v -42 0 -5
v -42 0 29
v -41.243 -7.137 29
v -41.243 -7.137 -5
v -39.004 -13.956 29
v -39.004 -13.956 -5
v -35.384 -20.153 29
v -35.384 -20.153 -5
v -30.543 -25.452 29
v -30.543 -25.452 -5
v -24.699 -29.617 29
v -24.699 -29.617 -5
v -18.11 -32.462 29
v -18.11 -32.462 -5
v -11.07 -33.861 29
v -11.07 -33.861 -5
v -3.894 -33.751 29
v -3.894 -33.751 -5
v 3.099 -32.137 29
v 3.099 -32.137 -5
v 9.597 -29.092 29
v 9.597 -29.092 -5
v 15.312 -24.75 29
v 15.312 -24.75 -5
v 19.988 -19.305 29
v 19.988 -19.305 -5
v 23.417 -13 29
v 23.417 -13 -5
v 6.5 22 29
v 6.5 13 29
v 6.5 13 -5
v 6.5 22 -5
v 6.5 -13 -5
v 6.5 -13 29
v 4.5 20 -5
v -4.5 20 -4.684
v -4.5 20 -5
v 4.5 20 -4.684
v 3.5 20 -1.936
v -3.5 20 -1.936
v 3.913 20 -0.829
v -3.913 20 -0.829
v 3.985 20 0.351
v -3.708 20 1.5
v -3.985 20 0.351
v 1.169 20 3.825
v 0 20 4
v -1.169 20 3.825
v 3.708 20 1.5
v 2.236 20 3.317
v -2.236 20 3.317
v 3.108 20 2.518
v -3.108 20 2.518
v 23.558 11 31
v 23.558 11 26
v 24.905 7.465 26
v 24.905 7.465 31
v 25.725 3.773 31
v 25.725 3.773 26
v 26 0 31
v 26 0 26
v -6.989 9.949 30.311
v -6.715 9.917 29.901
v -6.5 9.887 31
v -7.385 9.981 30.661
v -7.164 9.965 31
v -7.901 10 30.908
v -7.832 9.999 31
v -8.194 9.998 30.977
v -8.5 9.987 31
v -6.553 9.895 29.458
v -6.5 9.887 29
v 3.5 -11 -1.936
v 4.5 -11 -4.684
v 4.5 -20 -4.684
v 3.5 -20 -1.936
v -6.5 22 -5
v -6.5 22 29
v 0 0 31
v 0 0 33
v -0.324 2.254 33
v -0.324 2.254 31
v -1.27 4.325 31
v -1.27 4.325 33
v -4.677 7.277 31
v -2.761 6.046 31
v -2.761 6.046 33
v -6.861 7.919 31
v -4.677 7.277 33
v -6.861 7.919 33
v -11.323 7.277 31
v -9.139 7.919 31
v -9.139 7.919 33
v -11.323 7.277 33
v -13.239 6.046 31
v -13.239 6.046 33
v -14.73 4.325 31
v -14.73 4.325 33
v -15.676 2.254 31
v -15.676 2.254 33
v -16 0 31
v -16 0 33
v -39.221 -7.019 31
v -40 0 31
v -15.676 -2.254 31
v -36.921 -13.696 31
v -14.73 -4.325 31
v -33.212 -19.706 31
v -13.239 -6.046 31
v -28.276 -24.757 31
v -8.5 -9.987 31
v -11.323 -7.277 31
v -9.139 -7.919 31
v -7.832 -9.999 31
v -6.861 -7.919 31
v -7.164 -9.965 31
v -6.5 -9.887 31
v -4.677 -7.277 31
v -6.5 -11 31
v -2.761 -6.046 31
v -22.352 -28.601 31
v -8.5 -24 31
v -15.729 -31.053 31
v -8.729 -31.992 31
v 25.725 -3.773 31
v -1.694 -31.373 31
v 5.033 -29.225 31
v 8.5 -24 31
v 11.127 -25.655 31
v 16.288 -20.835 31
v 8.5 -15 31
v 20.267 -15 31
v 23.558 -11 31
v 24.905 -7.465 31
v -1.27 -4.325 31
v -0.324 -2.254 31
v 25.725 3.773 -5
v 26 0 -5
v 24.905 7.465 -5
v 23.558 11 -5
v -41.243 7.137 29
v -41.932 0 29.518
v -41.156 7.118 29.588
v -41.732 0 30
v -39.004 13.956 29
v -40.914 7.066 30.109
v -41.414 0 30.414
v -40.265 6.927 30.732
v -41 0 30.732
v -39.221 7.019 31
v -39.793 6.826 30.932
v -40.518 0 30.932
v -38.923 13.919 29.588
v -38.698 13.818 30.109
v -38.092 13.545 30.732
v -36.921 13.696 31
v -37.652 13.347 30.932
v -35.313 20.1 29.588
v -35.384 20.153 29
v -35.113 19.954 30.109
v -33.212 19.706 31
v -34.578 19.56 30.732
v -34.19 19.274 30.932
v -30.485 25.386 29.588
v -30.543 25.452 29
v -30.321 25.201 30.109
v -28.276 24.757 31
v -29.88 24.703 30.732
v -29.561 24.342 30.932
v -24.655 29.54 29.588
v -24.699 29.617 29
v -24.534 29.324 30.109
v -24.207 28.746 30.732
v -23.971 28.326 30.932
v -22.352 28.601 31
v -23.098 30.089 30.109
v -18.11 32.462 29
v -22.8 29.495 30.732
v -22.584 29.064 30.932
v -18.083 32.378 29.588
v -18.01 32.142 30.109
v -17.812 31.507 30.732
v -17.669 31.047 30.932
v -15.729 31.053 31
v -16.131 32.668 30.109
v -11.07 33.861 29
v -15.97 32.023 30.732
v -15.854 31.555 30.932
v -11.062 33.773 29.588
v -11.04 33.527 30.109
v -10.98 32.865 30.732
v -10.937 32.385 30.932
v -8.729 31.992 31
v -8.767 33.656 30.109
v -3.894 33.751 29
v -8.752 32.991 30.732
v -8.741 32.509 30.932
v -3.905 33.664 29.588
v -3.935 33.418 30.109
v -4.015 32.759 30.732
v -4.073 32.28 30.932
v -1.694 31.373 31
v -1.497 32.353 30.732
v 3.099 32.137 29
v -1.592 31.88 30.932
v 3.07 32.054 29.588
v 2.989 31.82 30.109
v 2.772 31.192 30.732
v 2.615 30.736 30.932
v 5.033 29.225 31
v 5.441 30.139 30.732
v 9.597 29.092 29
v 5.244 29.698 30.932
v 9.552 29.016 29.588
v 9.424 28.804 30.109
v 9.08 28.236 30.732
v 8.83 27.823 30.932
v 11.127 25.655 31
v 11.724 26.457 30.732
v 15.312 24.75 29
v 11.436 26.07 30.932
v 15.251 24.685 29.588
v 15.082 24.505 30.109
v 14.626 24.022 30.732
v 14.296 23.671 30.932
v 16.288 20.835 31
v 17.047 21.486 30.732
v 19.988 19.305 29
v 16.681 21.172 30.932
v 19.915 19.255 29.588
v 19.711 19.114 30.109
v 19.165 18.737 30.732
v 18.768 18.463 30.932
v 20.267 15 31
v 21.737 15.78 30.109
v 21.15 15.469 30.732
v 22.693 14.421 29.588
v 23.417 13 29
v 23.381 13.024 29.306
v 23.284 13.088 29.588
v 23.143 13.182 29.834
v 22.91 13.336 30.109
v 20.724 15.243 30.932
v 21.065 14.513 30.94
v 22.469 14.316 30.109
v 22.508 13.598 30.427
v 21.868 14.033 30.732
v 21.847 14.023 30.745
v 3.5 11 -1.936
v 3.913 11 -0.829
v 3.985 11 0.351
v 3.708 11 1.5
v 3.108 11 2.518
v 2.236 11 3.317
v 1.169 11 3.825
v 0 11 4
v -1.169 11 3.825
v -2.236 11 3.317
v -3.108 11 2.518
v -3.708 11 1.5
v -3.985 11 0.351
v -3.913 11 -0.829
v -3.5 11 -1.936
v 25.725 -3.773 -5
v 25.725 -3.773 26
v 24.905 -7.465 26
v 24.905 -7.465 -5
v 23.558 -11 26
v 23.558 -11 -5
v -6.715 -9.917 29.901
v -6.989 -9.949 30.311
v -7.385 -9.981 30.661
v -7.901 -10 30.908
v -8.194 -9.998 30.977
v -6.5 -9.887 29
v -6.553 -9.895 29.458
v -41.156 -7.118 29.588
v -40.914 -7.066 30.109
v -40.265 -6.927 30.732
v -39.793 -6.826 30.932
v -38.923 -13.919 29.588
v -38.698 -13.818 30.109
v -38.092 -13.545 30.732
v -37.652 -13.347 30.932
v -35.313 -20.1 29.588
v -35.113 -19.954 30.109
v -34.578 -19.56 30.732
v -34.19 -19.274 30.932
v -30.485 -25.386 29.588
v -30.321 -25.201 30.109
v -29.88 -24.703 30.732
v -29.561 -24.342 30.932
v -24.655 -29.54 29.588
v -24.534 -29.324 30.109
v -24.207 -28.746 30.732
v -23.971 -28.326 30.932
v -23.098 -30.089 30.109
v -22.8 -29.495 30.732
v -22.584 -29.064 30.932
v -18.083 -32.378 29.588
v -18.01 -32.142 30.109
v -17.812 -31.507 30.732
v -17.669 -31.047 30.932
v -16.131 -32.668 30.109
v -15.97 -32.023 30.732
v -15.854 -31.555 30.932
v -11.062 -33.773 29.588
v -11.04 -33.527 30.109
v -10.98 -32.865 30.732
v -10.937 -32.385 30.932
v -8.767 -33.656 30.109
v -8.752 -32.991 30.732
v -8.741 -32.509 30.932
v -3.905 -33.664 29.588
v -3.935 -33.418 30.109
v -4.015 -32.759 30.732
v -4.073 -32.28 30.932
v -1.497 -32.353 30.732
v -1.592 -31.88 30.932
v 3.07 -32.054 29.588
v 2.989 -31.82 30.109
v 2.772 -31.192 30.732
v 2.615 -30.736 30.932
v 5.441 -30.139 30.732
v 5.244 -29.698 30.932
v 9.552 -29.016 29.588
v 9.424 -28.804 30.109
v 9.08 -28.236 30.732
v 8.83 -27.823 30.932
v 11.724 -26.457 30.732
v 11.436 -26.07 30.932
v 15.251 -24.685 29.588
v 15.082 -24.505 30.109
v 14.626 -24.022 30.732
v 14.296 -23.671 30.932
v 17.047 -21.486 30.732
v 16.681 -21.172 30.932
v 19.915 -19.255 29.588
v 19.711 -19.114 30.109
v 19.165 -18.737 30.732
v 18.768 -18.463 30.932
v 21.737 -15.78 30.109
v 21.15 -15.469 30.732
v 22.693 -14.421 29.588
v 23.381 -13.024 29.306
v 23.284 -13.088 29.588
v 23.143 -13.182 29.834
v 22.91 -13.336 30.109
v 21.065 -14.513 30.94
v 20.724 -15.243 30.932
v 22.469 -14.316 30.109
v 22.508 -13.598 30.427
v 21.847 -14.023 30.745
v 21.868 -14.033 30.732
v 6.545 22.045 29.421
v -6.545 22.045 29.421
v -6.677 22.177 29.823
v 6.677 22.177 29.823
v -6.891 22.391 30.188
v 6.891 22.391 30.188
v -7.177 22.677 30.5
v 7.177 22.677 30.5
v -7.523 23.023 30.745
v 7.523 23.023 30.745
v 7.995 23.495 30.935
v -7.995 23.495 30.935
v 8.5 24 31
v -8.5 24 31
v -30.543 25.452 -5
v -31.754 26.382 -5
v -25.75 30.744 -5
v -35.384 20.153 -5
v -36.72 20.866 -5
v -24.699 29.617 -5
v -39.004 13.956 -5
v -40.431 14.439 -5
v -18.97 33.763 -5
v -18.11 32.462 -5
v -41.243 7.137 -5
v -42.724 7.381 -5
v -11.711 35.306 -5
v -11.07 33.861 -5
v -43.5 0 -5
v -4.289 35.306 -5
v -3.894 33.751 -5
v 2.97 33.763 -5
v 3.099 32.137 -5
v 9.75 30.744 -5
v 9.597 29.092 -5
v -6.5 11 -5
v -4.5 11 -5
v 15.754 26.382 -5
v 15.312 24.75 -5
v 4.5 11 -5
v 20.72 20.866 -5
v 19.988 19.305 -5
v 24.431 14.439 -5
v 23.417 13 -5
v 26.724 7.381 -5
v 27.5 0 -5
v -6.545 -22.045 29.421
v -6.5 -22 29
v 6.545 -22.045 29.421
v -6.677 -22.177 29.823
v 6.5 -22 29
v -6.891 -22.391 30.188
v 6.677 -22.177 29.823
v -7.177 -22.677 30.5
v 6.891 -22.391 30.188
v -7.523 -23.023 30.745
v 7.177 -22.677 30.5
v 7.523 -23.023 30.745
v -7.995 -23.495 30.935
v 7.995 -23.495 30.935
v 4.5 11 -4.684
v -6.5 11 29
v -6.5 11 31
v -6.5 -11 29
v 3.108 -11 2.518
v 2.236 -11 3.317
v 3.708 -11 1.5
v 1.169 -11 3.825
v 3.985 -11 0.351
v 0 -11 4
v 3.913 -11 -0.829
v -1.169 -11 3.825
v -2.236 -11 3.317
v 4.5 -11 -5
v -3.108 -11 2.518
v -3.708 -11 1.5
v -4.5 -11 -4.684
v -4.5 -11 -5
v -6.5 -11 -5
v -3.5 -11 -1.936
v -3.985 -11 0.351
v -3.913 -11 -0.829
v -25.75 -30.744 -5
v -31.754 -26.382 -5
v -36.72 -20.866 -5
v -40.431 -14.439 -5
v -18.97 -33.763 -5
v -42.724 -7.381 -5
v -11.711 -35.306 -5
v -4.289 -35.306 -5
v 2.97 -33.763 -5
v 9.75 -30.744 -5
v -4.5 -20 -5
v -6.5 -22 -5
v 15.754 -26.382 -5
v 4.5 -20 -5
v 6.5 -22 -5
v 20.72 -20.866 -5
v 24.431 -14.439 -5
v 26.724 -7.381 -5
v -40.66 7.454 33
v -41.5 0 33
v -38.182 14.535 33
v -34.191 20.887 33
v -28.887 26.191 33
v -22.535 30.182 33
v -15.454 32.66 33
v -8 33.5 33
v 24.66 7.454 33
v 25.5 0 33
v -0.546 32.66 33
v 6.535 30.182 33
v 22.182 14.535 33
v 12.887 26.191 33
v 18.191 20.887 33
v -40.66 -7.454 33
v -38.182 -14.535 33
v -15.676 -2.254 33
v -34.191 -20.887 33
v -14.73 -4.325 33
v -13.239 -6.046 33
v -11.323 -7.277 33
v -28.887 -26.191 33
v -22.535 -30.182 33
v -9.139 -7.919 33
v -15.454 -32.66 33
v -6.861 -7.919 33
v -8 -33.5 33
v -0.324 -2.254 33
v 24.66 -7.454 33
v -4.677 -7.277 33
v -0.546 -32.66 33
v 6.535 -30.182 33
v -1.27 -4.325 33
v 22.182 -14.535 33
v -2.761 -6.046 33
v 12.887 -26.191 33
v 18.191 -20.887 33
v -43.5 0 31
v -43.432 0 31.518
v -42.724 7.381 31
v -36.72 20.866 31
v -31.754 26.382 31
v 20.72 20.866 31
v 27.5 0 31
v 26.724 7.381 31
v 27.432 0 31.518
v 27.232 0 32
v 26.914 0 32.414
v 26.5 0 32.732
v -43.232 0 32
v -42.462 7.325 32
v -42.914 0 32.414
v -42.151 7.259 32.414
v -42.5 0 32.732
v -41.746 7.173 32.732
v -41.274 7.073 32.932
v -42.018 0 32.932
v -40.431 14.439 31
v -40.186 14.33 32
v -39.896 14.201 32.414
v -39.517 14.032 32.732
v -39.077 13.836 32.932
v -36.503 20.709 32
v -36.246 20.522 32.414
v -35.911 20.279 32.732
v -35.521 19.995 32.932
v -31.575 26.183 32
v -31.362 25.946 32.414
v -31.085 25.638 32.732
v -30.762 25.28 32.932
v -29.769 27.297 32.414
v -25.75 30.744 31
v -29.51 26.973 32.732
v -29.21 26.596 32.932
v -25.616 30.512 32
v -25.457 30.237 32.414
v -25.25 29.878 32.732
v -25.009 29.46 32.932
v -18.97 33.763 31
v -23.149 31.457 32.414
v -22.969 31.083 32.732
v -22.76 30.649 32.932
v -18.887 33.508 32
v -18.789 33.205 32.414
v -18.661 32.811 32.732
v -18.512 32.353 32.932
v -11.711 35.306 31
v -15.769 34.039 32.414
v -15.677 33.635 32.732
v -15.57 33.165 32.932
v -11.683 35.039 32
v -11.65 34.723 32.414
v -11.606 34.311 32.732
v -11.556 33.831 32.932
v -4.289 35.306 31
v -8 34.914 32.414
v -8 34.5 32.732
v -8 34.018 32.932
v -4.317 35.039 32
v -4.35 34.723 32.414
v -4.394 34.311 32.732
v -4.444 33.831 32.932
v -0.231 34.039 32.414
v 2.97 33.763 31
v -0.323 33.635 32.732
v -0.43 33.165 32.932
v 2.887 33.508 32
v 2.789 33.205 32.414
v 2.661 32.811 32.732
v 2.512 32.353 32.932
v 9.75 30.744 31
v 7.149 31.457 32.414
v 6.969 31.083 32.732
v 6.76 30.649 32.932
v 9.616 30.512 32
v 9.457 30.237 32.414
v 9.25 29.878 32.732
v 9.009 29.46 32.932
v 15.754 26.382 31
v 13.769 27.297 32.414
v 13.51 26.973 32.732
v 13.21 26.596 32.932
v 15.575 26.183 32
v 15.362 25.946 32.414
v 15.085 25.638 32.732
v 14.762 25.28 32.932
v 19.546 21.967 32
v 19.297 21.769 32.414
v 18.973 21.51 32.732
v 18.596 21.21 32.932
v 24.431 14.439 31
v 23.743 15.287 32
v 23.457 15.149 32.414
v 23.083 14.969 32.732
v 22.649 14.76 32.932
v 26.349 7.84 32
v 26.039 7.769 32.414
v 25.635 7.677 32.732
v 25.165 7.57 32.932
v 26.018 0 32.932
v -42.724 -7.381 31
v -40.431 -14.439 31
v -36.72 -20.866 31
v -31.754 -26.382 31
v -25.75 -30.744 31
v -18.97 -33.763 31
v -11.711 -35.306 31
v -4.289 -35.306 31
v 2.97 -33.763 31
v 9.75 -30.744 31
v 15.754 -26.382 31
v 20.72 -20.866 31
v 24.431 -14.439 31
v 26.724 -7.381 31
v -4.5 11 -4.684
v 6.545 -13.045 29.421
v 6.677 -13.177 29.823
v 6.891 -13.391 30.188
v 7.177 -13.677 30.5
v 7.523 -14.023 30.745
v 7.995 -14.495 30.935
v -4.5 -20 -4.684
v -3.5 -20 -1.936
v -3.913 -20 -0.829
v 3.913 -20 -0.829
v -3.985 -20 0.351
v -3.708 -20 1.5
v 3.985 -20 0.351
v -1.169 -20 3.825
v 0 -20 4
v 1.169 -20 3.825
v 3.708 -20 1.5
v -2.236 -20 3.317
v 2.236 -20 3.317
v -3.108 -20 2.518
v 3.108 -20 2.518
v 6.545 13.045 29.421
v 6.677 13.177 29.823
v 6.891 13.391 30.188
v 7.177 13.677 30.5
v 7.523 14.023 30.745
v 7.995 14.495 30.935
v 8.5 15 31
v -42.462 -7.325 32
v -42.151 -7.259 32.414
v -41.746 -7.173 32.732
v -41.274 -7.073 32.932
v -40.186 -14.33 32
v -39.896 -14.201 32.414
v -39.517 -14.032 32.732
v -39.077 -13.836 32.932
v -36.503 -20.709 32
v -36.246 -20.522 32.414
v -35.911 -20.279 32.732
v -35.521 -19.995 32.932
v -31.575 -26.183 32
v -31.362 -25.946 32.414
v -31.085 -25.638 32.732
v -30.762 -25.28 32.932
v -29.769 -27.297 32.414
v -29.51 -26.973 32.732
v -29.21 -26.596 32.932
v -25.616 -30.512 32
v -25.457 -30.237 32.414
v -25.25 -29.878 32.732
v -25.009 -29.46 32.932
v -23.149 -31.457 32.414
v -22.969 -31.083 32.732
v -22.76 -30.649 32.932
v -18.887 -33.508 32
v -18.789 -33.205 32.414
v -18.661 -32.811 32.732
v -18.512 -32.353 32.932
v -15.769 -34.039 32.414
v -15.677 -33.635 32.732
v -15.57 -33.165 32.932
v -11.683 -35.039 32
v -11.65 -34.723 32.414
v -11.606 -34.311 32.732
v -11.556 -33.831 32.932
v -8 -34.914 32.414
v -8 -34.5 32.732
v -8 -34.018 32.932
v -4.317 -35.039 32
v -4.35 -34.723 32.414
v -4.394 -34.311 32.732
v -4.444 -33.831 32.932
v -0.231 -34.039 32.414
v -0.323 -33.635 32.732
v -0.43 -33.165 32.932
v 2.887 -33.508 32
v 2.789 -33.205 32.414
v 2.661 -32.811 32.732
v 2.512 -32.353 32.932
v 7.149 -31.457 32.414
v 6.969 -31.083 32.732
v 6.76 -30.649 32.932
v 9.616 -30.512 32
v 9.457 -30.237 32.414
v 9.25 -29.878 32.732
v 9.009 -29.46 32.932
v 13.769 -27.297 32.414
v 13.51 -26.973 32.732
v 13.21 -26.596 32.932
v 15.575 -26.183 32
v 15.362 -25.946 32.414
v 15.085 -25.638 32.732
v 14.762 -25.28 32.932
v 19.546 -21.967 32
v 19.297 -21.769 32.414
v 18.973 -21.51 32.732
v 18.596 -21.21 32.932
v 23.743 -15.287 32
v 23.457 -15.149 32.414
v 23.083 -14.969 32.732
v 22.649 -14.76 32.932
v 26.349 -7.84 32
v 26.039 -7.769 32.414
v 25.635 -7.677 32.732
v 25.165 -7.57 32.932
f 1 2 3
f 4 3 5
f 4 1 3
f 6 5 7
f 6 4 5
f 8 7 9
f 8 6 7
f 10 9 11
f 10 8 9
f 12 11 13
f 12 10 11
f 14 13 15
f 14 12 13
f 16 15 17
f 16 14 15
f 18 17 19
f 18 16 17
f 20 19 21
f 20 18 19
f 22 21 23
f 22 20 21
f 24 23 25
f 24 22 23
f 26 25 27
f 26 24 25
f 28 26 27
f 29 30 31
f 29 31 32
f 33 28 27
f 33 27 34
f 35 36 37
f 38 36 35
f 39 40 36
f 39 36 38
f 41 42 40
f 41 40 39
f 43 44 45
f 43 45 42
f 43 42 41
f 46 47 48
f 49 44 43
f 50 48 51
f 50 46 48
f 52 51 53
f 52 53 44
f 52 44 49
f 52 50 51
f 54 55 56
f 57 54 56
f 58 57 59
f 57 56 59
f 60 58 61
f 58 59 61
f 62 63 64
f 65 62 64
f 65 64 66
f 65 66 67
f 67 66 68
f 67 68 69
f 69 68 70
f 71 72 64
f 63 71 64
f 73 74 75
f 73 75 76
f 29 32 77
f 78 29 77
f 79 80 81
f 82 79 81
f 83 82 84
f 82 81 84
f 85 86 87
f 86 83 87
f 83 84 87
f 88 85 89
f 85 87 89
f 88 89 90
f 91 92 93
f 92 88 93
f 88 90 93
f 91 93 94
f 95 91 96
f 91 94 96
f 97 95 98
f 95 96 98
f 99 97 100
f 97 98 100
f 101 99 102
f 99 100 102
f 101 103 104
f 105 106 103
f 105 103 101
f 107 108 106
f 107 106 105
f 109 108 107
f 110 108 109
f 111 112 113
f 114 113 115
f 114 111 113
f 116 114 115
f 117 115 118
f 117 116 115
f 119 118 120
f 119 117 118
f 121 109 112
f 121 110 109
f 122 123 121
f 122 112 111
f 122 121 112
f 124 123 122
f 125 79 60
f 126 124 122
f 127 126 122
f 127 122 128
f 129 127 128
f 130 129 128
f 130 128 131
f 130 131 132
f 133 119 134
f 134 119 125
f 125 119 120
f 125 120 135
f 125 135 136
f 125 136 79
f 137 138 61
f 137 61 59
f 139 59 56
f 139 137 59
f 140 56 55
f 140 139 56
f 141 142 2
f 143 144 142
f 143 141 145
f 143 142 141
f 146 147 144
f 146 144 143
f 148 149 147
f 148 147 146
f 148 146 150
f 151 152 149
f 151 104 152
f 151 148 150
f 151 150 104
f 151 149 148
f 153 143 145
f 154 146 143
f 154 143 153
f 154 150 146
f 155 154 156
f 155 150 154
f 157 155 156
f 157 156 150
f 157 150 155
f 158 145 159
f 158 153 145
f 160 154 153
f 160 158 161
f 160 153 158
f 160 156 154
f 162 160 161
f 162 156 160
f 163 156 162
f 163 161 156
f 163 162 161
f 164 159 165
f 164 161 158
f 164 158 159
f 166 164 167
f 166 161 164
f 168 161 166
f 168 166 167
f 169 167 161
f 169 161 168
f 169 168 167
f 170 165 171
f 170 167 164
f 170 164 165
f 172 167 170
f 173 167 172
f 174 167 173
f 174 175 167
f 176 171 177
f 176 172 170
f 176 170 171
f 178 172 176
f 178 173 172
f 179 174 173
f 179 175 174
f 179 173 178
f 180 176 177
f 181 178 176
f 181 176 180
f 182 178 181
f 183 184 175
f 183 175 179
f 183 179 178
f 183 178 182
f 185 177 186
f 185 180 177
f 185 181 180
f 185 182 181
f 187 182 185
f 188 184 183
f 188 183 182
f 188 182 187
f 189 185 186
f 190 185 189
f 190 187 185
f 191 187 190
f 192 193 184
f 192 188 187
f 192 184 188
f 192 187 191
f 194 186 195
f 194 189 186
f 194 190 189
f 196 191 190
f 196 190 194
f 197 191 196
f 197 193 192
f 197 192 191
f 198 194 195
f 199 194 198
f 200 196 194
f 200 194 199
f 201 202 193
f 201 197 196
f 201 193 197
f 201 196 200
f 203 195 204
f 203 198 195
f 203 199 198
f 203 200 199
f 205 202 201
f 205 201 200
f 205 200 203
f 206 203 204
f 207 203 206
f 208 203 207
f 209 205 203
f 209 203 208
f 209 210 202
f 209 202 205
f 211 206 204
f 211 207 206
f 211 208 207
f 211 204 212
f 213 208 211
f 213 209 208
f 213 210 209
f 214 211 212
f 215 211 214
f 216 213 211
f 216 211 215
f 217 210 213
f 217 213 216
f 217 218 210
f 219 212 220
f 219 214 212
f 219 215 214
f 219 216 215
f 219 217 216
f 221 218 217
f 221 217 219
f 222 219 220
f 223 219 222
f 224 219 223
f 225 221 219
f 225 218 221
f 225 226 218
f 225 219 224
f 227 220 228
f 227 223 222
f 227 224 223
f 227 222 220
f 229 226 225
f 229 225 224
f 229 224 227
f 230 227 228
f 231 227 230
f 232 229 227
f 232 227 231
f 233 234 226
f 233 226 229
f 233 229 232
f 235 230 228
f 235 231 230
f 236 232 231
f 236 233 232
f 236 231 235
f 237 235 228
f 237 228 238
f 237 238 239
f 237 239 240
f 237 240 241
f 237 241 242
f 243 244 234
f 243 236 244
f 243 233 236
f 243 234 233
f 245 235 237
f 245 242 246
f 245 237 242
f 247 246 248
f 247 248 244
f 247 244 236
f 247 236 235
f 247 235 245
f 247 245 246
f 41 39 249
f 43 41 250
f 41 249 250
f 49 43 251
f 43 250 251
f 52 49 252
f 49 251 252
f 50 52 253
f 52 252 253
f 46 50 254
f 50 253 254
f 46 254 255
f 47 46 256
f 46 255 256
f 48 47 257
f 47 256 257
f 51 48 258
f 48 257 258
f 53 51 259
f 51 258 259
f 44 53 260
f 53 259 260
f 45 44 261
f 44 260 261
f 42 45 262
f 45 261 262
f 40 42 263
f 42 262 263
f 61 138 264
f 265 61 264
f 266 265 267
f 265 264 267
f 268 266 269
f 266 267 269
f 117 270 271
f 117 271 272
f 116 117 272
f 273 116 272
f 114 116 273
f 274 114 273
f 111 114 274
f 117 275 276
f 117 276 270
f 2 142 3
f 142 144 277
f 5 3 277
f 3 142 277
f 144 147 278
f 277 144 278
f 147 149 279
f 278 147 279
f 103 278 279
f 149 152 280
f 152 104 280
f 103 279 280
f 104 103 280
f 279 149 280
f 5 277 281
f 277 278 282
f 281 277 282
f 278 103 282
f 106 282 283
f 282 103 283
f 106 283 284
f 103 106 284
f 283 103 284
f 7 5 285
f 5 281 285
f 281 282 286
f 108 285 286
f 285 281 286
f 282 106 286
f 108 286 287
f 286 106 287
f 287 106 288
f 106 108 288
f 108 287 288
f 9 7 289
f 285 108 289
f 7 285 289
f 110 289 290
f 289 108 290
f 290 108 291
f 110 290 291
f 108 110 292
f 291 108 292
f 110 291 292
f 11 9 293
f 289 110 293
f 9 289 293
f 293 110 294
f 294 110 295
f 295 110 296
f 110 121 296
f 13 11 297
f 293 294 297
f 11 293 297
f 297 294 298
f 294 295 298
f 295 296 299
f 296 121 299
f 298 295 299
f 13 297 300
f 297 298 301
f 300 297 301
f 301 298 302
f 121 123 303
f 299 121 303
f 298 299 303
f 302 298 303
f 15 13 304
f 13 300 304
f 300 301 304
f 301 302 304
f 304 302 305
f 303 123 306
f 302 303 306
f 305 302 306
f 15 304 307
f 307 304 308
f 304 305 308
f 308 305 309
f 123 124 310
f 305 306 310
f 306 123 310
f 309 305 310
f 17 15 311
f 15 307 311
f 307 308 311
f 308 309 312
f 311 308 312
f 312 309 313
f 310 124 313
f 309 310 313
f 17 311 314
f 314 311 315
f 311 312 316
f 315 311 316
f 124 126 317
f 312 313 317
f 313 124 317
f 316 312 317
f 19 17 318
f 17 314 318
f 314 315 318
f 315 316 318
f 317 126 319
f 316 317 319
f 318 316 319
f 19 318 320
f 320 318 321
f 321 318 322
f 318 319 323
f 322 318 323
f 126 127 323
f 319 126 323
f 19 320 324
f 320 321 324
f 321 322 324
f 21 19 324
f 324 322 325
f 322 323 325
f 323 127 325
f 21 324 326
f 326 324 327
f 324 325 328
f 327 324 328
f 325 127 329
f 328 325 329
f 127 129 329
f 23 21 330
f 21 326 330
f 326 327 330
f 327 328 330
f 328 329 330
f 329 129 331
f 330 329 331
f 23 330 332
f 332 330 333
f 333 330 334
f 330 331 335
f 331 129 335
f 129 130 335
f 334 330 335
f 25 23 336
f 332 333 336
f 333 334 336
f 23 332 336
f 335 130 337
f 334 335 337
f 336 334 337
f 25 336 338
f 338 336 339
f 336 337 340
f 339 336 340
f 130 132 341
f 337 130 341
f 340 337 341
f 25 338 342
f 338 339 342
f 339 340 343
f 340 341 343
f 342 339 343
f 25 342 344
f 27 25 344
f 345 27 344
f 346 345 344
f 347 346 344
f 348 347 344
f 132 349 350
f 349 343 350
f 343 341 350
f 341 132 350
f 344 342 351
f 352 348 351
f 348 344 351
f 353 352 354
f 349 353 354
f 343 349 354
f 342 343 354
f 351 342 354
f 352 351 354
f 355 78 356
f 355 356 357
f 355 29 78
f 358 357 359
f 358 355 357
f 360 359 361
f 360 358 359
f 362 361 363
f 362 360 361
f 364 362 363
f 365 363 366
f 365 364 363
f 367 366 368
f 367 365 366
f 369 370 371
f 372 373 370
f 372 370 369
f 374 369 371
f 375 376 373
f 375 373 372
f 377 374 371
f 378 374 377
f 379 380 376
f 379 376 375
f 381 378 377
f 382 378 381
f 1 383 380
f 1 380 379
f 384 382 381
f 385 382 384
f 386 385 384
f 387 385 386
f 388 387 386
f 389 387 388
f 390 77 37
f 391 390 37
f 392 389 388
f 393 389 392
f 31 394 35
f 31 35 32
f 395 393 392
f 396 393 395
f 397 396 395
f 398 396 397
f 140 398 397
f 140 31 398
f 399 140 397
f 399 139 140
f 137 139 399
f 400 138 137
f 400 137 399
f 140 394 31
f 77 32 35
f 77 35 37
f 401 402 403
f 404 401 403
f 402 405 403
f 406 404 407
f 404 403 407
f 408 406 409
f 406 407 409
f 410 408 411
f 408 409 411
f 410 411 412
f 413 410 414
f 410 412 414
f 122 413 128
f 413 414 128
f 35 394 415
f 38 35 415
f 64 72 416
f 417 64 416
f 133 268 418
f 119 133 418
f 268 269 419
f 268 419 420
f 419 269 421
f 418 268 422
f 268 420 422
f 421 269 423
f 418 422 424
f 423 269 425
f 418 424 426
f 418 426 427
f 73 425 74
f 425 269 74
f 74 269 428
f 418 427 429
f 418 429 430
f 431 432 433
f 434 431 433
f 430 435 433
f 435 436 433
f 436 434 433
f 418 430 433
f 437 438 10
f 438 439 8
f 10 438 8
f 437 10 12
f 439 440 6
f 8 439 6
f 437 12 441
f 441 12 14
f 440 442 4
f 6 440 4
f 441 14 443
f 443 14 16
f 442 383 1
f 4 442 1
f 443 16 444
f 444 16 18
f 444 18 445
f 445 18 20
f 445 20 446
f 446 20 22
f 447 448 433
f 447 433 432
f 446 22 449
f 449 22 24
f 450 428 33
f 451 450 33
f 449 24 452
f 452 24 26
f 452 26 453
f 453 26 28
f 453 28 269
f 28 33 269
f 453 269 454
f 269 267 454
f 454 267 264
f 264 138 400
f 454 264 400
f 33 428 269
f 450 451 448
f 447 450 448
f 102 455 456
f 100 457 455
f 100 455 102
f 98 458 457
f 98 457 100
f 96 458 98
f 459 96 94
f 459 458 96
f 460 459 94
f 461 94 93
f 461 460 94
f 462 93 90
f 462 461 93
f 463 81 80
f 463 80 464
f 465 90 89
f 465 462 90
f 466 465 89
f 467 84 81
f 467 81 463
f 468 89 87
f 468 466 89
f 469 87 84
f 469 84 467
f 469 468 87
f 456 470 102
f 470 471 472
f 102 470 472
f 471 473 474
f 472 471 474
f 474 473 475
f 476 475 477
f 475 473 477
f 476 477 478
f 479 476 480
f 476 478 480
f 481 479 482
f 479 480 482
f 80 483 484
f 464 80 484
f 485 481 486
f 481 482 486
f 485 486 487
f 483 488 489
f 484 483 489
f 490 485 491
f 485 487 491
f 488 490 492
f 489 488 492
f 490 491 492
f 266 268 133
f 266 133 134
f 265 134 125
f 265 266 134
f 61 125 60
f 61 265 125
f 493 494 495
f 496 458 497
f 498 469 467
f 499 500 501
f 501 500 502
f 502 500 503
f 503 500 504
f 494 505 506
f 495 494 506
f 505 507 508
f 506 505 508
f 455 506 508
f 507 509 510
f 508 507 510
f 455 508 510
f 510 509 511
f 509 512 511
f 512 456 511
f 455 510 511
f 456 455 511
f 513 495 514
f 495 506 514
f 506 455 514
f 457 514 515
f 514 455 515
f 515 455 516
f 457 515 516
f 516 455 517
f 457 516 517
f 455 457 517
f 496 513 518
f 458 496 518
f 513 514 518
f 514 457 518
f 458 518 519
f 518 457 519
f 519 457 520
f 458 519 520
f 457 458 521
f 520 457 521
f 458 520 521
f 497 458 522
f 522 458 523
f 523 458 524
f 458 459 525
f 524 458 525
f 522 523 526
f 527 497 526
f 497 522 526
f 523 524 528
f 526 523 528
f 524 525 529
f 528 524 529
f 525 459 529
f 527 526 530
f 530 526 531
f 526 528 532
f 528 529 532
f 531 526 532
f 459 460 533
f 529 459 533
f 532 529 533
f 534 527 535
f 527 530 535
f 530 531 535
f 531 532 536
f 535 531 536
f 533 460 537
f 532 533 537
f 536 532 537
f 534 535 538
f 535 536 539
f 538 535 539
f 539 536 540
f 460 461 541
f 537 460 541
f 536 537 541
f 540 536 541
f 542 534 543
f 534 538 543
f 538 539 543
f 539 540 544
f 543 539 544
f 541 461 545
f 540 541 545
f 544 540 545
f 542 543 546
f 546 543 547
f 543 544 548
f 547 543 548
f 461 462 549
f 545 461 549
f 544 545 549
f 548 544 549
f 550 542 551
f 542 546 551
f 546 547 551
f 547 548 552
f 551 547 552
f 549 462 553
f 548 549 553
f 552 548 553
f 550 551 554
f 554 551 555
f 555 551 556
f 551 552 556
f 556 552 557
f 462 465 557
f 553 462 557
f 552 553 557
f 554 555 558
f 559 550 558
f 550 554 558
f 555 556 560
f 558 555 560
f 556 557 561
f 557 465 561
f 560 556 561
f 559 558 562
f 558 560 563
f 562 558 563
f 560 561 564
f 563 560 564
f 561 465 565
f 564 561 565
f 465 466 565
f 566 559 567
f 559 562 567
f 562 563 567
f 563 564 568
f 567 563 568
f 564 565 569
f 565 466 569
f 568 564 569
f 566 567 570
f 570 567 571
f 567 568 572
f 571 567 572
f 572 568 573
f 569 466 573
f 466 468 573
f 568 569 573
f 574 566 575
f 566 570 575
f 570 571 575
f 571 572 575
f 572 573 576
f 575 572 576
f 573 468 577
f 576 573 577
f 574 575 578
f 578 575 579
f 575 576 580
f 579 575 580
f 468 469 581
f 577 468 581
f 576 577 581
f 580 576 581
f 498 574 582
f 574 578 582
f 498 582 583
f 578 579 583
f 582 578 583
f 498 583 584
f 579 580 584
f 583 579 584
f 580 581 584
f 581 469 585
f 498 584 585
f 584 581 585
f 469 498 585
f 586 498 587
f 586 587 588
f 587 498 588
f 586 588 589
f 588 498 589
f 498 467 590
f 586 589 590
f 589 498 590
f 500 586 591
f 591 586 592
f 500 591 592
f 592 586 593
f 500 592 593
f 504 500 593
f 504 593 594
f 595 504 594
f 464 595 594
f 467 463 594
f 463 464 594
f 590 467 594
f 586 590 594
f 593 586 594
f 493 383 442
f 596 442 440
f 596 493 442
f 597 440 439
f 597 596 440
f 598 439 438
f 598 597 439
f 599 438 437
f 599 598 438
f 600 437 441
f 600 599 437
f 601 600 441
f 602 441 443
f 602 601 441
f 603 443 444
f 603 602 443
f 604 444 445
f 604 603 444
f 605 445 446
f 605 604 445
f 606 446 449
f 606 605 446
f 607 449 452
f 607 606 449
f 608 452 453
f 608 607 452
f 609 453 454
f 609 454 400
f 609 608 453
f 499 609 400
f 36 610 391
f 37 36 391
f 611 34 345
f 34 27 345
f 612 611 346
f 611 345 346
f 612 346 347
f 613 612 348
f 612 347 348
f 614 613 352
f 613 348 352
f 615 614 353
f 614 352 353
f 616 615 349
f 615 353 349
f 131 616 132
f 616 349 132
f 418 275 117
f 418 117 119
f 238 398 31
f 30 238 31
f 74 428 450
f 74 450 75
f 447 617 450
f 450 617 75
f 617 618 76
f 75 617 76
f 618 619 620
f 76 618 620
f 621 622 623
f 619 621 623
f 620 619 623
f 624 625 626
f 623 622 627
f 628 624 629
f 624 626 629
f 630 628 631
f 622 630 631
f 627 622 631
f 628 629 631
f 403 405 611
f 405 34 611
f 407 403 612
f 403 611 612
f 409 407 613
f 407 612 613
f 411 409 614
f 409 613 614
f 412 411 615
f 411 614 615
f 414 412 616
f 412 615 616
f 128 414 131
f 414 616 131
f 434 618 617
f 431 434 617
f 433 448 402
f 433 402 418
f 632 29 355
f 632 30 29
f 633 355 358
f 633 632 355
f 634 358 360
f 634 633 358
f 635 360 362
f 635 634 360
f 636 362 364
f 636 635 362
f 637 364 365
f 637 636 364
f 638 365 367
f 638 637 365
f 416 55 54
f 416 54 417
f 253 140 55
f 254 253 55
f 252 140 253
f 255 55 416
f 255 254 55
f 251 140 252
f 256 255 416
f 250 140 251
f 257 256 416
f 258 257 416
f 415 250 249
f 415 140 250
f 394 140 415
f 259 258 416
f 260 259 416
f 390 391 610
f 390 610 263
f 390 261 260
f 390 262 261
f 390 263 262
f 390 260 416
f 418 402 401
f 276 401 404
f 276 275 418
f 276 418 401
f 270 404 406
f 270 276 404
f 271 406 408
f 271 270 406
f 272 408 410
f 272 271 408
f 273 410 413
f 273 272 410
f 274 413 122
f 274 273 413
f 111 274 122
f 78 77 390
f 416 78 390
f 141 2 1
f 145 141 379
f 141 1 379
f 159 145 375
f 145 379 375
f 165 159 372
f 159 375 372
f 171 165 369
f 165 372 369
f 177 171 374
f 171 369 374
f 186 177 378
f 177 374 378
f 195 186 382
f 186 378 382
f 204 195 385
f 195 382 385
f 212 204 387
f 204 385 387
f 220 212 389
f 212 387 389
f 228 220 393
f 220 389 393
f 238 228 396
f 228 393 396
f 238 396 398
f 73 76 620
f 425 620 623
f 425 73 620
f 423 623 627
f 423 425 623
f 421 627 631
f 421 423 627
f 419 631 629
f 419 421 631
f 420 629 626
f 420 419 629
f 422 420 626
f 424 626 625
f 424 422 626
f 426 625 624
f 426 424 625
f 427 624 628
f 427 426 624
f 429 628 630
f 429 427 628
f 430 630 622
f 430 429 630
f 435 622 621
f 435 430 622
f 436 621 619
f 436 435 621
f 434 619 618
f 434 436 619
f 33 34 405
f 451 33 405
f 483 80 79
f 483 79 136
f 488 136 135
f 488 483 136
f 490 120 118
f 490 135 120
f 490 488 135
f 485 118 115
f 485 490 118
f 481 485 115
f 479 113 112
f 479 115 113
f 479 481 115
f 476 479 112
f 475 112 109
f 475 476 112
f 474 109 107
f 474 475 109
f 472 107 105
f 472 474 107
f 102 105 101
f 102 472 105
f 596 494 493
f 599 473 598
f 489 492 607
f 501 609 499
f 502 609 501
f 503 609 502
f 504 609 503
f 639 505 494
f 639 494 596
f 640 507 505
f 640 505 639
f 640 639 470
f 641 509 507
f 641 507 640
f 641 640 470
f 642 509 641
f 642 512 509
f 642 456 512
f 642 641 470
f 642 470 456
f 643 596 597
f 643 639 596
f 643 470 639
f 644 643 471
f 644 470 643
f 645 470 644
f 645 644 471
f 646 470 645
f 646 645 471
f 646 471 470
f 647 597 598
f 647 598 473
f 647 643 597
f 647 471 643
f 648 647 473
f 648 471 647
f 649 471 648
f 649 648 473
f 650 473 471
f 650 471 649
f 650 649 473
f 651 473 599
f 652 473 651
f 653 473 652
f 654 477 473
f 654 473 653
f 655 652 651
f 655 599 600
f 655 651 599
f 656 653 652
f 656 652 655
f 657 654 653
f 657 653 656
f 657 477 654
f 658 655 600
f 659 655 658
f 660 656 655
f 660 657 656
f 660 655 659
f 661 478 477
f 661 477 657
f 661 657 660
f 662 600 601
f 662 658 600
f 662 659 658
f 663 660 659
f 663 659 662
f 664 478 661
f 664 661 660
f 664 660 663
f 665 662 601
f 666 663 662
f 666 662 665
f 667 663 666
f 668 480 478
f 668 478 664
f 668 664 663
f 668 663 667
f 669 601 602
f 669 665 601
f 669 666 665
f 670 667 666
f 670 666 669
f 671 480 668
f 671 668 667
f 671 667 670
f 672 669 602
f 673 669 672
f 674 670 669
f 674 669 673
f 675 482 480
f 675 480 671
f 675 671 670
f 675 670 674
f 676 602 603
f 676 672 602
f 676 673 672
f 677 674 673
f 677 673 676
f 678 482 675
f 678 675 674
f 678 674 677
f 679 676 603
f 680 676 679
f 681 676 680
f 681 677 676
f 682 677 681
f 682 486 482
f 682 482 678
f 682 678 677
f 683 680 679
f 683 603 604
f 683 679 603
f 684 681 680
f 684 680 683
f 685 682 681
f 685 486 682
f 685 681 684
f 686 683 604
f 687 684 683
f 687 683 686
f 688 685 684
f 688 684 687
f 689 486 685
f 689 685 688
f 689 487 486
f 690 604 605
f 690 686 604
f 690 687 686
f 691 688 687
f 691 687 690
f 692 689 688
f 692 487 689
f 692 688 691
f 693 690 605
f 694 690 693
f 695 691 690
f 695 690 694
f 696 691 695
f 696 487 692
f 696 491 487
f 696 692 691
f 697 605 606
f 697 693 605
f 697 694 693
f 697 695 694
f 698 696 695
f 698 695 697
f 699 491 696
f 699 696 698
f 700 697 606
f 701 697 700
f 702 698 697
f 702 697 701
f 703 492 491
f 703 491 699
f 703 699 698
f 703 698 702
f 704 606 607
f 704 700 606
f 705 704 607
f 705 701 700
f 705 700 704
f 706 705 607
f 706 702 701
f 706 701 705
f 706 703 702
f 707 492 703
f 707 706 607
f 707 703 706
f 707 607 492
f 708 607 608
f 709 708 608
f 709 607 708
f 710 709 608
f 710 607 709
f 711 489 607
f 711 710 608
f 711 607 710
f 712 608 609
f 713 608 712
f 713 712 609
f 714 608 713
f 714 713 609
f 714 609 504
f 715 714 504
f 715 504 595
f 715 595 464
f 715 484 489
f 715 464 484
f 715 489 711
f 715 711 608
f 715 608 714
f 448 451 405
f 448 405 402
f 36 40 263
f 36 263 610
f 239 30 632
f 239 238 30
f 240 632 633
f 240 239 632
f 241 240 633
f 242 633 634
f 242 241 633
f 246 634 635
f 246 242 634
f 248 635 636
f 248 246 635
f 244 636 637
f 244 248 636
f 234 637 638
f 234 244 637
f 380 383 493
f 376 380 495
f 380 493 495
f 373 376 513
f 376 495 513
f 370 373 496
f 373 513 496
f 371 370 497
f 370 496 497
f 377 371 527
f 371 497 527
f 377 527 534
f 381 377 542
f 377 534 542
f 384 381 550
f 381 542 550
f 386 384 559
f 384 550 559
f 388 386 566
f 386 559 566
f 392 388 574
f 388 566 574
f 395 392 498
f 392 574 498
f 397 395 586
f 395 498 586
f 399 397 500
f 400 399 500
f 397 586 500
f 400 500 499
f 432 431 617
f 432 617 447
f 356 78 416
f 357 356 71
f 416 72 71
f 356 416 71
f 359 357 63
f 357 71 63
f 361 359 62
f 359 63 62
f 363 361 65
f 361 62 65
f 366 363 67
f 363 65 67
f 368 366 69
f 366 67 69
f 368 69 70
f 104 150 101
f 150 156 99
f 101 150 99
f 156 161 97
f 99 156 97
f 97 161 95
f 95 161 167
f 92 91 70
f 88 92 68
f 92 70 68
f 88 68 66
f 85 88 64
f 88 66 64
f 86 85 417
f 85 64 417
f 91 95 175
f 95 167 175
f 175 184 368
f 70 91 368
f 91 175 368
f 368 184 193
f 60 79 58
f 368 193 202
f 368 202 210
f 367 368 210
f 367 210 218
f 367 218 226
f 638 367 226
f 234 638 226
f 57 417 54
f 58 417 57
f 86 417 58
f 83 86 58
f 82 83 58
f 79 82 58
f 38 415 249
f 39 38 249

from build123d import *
from build123d import SkipClean  # not in build123d's __all__

# Parameters (mm, degrees)
F3_DEPTH  = 36
F5_DEPTH  = 20
F7_DEPTH  = 36.001
F10_R     = 10
F11_DEPTH = 7
F12_R     = 10
F12_R_2   = 8
F13_DEPTH = 2
F14_W     = 113.5210208595
F14_H     = 51.0865971446
F15_DEPTH = 38.001
F16_W     = 26.7383140922
F16_H     = 24.3122323528
F17_DEPTH = 36
F18_R     = 2
F20_DEPTH = 5


with BuildPart() as f1:
    # F0 (on Front) → F1 (revolve)
    with BuildSketch(Plane.XZ):
        Polygon((26, -5), (27.5, -5), (27.5, 31), (0, 31), (0, 26), (26, 26), (26, 0), align=None)
    revolve(axis=Axis((0, 0, 28.5), (0, 0, 1)))

    # F2 (on face) → F3 (join, through all)
    with BuildSketch(Plane(origin=(0, 0, -5), x_dir=(1, 0, 0), z_dir=(0, 0, -1))):
        with BuildLine():
            Line((-23.5584379788, 11), (23.5584379788, 11))
            ThreePointArc((23.5584379788, 11), (0, 26), (-23.5584379788, 11))
        make_face()
        with BuildLine():
            Line((23.5584379788, -11), (-23.5584379788, -11))
            ThreePointArc((-23.5584379788, -11), (0, -26), (23.5584379788, -11))
        make_face()
    extrude(amount=-F3_DEPTH)

    # F4 (on Front) → F5 (cut, symmetric)
    with BuildSketch(Plane.XZ):
        with BuildLine():
            Line((4.5, -4.6839690926), (3.5, -1.9364916731))
            ThreePointArc((3.5, -1.9364916731), (3.4457195687, 2.0315060063), (0, 4))
            ThreePointArc((0, 4), (-3.4457195687, 2.0315060063), (-3.5, -1.9364916731))
            Line((-3.5, -1.9364916731), (-4.5, -4.6839690926))
            Line((-4.5, -4.6839690926), (-4.5, -5))
            Line((-4.5, -5), (0, -5))
            Line((0, -5), (4.5, -5))
            Line((4.5, -5), (4.5, -4.6839690926))
        make_face()
    extrude(amount=F5_DEPTH, both=True, mode=Mode.SUBTRACT)

    # F6 (on face) → F7 (cut, through all)
    with BuildSketch(Plane(origin=(0, 0, -5), x_dir=(1, 0, 0), z_dir=(0, 0, -1))):
        with BuildLine():
            Line((24.2332416321, -13), (6.5, -13))
            Line((6.5, -13), (6.5, -22))
            Line((6.5, -22), (-6.5, -22))
            Line((-6.5, -22), (-6.5, -13))
            Line((-6.5, -13), (-24.2332416321, -13))
            ThreePointArc((-24.2332416321, -13), (0, -27.5), (24.2332416321, -13))
        make_face()
        with BuildLine():
            Line((6.5, 22), (6.5, 13))
            Line((6.5, 13), (24.2332416321, 13))
            ThreePointArc((24.2332416321, 13), (0, 27.5), (-24.2332416321, 13))
            Line((-24.2332416321, 13), (-6.5, 13))
            Line((-6.5, 13), (-6.5, 22))
            Line((-6.5, 22), (6.5, 22))
        make_face()
    extrude(amount=-F7_DEPTH, mode=Mode.SUBTRACT)

    # F8 (on Front) → F9 (revolve)
    with BuildSketch(Plane.XZ):
        Polygon((26, -5), (27.5, -5), (27.5, 33), (-8, 33), (-8, 31), (26, 31), align=None)
    revolve(axis=Axis((-8, 0, 32), (0, 0, -1)))

    # F10 (on face) → F11 (cut, through all)
    with BuildSketch(Plane.XY.offset(33)):
        with Locations((-8, 0)):
            Circle(F10_R)
    extrude(amount=-F11_DEPTH, mode=Mode.SUBTRACT)

    # F12 (on face) → F13 (join)
    with BuildSketch(Plane.XY.offset(33)):
        with Locations((-8, 0)):
            Circle(F12_R)
        with Locations((-8, 0)):
            Circle(F12_R_2, mode=Mode.SUBTRACT)
    extrude(amount=-F13_DEPTH)

    # F14 (on face) → F15 (cut, through all)
    with BuildSketch(Plane.XY.offset(33)):
        with Locations((0.0438708812, -25.5432985723)):
            Rectangle(F14_W, F14_H)
    extrude(amount=-F15_DEPTH, mode=Mode.SUBTRACT)

    # F16 (on face) → F17 (cut, through all)
    with BuildSketch(Plane(origin=(0, 0, -5), x_dir=(1, 0, 0), z_dir=(0, 0, -1))):
        with Locations((-19.8691570461, -0.8438838236)):
            Rectangle(F16_W, F16_H)
    extrude(amount=-F17_DEPTH, mode=Mode.SUBTRACT)

    # F18
    f18_edges = [f1.edges().sort_by_distance(p)[0] for p in [
        (-14.627107, 33.347885, 31),
        (-8, 35.5, 33),
        (-6.5, 15.94343, 31),
        (0, 22, 31),
        (6.5, 17.5, 31),
        (14.958278, 13, 31),
    ]]
    fillet(f18_edges, radius=F18_R)

    # F19 (on face) → F20 (cut, through all)
    with BuildSketch(Plane(origin=(0, 0, 26), x_dir=(1, 0, 0), z_dir=(0, 0, -1))):
        with BuildLine():
            ThreePointArc((2, 0), (-0.4171245559, -6.5192024052), (-6.5, -9.8868599666))
            Line((-6.5, -9.8868599666), (-6.5, -11))
            Line((-6.5, -11), (23.5584379788, -11))
            ThreePointArc((23.5584379788, -11), (25.3822712483, -5.6338535902), (26, 0))
            Line((26, 0), (2, 0))
        make_face()
    extrude(amount=-F20_DEPTH, mode=Mode.SUBTRACT)

    # F21: F1 across face


with BuildPart() as f1_1:
    add(f1.part, clean=False)
    with SkipClean():  # cleaning this boolean's faces spoils the solid; the shape is the same uncleaned
        add(f1.part.mirror(Plane(origin=(-36.1785540273, 0, 22.5714053698), x_dir=(1, 0, 0), z_dir=(0, -1, 0))), clean=False)


solid = f1_1.part
